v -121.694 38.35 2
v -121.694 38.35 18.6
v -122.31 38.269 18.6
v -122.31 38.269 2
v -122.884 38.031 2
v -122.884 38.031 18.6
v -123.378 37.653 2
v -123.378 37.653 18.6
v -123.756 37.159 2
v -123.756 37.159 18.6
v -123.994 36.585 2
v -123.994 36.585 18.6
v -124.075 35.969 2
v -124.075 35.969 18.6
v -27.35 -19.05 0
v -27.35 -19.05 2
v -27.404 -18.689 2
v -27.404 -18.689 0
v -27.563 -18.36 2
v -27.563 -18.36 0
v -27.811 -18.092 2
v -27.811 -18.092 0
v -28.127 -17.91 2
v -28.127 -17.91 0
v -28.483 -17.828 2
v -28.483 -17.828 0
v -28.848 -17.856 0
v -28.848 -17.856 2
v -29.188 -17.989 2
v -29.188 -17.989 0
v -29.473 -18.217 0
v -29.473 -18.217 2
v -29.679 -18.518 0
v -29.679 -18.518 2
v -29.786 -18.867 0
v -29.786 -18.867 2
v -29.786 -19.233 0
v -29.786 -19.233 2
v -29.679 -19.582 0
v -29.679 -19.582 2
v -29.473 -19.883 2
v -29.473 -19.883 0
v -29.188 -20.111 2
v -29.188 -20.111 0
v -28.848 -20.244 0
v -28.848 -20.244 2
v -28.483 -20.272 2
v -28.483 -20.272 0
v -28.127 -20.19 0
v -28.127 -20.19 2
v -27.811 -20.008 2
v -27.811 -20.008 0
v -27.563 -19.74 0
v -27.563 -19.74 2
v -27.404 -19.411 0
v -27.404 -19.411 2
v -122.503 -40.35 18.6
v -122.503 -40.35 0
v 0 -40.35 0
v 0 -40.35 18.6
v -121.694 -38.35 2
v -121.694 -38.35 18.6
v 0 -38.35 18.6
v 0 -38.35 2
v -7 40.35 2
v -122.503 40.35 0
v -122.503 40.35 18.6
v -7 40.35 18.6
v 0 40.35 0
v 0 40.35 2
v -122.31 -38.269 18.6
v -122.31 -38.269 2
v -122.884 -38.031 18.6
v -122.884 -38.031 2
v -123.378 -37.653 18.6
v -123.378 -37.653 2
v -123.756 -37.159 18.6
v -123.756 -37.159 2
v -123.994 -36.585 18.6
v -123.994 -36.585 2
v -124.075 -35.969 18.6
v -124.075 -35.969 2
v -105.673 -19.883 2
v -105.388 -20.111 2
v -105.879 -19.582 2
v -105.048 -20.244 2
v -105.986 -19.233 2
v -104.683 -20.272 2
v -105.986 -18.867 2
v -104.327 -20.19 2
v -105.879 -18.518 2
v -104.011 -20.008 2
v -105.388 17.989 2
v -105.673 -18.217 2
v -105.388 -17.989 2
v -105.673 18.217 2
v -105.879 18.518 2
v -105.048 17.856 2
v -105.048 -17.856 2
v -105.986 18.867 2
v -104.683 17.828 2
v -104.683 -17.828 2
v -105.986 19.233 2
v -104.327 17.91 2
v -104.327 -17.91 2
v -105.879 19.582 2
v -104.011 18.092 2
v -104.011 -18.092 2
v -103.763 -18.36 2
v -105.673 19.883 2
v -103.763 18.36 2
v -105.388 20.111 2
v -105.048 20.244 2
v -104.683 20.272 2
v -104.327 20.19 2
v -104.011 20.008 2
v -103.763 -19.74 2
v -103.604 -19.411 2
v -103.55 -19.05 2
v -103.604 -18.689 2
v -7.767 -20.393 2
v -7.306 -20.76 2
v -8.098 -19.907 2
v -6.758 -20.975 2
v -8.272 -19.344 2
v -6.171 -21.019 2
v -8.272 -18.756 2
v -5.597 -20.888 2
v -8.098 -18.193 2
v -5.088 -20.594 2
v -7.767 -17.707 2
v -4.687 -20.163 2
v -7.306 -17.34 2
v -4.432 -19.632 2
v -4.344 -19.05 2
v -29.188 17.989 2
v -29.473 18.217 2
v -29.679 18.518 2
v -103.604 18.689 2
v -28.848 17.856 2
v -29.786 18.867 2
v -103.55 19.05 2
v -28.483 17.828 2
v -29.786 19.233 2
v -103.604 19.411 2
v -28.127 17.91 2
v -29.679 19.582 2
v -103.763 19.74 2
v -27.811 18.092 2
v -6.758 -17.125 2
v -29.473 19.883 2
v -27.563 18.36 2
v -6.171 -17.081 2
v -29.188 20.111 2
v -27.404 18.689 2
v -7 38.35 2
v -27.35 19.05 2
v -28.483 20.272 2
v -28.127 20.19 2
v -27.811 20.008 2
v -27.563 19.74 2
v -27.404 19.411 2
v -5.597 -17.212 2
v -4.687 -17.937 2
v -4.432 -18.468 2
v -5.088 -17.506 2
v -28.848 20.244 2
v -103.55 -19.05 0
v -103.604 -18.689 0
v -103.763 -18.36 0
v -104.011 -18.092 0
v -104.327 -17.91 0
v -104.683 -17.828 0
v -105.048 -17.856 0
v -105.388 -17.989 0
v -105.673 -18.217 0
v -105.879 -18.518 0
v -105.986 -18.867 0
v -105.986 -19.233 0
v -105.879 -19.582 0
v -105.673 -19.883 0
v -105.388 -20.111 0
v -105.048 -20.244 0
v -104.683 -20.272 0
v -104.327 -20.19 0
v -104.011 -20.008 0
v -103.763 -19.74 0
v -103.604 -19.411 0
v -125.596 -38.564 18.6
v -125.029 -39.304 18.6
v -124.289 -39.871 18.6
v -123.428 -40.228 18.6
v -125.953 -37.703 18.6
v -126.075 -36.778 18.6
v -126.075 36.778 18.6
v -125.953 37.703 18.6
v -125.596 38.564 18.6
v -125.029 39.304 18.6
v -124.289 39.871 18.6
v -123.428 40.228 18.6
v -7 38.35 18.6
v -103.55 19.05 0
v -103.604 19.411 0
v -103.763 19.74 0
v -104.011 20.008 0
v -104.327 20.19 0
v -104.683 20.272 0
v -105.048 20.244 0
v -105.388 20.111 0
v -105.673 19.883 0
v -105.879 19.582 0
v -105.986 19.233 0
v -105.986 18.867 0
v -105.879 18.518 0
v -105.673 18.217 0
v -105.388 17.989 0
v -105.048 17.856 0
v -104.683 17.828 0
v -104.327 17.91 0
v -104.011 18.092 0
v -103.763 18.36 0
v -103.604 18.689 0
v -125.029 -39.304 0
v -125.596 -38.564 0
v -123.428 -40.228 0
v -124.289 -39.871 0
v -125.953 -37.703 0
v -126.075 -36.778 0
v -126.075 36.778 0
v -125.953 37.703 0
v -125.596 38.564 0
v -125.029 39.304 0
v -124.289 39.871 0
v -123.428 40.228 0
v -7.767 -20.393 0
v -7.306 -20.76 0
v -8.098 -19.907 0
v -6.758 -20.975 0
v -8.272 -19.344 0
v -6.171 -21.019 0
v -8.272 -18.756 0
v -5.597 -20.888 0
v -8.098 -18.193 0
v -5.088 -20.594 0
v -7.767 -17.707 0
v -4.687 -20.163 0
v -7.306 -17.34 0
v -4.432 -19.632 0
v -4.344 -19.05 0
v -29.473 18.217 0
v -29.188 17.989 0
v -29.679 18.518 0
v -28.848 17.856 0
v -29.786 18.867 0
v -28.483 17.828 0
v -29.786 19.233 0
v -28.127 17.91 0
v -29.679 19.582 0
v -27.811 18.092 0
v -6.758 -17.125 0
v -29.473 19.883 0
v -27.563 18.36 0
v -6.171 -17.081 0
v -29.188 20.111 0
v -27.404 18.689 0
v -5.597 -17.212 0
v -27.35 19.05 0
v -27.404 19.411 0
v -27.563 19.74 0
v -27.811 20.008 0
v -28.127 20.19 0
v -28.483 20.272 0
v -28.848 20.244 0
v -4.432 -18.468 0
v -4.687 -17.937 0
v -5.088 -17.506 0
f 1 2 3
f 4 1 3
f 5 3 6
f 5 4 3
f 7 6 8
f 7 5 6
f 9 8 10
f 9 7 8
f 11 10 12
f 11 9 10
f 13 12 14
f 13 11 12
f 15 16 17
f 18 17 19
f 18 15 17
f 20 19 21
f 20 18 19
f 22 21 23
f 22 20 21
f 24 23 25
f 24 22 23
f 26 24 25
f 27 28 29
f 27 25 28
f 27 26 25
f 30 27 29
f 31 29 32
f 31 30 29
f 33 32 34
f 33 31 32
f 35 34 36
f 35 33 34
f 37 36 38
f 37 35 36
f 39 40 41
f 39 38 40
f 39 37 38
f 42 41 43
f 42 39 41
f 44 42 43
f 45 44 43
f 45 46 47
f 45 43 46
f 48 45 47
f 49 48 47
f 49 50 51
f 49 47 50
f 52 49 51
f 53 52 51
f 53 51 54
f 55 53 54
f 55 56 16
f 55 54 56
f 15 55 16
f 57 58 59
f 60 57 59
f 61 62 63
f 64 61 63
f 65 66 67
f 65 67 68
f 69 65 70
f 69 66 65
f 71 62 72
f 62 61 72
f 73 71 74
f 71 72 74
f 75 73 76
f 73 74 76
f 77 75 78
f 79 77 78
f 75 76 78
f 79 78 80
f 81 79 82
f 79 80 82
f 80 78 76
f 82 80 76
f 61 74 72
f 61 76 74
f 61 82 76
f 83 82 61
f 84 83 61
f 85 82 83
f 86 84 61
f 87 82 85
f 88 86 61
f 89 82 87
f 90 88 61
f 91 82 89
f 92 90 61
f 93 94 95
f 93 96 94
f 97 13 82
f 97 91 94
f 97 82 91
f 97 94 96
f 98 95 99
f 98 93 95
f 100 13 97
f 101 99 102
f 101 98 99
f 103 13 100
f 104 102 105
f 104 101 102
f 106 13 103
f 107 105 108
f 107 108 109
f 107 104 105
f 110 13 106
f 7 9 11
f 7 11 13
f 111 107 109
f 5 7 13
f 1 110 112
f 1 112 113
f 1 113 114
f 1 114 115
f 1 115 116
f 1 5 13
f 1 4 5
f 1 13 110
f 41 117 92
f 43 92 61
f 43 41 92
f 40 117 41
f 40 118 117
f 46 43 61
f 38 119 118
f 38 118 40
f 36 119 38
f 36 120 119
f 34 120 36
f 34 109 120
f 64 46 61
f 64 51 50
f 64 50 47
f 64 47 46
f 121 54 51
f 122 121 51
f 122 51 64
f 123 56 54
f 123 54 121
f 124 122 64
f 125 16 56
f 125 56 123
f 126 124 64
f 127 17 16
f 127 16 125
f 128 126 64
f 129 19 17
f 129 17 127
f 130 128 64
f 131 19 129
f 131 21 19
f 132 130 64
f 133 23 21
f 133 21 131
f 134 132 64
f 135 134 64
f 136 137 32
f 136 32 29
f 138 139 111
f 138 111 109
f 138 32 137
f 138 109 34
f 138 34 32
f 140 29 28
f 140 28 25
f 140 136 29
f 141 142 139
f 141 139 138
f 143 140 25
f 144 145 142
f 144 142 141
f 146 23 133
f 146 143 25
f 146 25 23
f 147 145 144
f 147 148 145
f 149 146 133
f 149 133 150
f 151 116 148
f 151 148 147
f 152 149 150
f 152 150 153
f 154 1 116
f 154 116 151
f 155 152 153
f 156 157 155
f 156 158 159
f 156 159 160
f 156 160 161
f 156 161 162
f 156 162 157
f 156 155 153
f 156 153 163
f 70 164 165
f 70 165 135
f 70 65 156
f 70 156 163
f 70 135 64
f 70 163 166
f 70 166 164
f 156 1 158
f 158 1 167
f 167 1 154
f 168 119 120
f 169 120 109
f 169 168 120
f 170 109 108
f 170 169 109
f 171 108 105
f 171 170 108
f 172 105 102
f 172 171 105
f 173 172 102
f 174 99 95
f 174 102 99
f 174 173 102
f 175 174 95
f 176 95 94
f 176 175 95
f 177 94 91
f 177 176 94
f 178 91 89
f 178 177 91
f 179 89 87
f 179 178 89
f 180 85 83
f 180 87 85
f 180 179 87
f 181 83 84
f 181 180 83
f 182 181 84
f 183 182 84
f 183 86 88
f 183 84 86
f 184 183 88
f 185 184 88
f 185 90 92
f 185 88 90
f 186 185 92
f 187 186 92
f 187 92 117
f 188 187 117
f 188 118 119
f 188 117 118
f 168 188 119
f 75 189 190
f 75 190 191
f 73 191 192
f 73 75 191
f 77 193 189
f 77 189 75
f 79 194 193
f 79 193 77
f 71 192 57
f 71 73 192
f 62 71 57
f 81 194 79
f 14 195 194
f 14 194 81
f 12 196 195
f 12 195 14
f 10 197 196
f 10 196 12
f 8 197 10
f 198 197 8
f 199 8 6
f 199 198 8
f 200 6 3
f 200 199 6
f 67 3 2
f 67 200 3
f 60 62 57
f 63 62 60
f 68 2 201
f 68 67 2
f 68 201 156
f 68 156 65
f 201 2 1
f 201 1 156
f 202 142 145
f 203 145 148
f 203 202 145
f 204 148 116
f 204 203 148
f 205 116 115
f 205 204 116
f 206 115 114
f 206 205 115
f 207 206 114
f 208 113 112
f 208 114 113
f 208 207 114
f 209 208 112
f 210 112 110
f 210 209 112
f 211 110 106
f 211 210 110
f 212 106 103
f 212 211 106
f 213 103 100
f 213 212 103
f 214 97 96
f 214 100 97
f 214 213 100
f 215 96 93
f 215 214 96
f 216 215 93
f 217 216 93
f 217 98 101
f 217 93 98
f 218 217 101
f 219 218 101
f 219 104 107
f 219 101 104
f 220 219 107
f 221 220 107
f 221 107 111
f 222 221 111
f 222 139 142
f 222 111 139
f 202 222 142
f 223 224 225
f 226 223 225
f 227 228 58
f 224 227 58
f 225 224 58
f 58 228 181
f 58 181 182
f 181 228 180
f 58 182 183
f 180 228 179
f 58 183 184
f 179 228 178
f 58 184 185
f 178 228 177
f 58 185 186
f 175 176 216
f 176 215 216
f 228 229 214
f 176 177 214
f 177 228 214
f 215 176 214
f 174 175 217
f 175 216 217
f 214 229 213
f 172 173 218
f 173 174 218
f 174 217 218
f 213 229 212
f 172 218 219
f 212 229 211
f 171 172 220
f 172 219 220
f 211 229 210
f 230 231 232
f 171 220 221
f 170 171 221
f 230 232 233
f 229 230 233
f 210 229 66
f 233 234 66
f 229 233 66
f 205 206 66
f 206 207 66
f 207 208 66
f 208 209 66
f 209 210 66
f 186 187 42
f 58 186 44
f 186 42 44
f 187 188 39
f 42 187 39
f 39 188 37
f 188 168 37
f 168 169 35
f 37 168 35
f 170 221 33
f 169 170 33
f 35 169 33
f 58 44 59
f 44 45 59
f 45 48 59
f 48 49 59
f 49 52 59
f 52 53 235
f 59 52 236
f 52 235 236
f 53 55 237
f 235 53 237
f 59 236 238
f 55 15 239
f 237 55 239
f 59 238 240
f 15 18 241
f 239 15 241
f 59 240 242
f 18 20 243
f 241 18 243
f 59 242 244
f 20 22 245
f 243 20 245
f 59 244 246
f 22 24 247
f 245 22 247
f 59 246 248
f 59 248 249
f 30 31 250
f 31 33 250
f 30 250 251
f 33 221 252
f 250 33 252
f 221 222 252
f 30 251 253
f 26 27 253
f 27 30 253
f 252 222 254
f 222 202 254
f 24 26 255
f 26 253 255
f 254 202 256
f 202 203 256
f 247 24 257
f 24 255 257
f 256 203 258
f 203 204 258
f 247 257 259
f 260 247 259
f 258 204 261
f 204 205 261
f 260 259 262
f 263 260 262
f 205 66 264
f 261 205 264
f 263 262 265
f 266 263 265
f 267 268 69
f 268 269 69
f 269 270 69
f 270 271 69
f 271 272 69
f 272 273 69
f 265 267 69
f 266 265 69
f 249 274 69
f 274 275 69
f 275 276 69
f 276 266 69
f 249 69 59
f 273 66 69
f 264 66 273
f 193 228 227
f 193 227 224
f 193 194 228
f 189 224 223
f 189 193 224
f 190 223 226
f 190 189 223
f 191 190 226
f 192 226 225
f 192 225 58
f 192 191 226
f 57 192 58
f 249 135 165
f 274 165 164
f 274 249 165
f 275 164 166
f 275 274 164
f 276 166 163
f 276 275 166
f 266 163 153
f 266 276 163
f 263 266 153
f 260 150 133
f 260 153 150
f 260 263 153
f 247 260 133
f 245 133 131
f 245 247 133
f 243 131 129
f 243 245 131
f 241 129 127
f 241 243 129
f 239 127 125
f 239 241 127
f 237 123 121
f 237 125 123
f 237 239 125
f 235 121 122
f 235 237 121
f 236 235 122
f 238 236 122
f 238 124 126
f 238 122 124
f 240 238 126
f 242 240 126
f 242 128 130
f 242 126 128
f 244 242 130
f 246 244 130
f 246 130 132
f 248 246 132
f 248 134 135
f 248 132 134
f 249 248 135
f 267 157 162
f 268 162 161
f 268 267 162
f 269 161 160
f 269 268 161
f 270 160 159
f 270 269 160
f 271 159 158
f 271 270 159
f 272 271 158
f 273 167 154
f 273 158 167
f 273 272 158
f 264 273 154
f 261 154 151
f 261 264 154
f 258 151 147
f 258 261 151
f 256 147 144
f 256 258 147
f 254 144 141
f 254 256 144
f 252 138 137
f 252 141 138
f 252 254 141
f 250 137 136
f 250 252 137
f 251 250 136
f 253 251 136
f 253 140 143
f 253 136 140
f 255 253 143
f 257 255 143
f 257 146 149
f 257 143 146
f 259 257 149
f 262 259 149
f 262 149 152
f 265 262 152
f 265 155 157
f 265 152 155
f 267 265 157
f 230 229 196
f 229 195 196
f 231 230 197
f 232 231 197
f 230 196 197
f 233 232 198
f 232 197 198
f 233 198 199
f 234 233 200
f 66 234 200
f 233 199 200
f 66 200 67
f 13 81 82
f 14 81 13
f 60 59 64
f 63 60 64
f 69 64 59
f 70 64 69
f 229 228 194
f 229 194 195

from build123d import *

# Parameters (mm, degrees)
SKETCH_W        = 252.15
SKETCH_H        = 80.7
SKETCH_R        = 1.225
SKETCH_R_2      = 1.975
PAD_DEPTH       = 18.6
SKETCH001_W     = 248.15
SKETCH001_H     = 76.7
POCKET_DEPTH    = 16.6
FILLET_R        = 2.3813
FILLET001_R     = 3.57195
SKETCH002_W     = 14
SKETCH002_H     = 2
POCKET001_DEPTH = 16.6
SKETCH003_W     = 131.259314
SKETCH003_H     = 131.259314
POCKET002_DEPTH = 20


with BuildPart() as part:
    # Sketch → Pad (new body)
    with BuildSketch(Plane.XY):
        Rectangle(SKETCH_W, SKETCH_H)
        with Locations((-104.775, 19.05)):
            Circle(SKETCH_R, mode=Mode.SUBTRACT)
        with Locations((-28.575, 19.05)):
            Circle(SKETCH_R, mode=Mode.SUBTRACT)
        with Locations((-6.3189, -19.05)):
            Circle(SKETCH_R_2, mode=Mode.SUBTRACT)
        with Locations((-104.775, -19.05)):
            Circle(SKETCH_R, mode=Mode.SUBTRACT)
        with Locations((-28.575, -19.05)):
            Circle(SKETCH_R, mode=Mode.SUBTRACT)
        with Locations((6.3189, -19.05)):
            Circle(SKETCH_R_2, mode=Mode.SUBTRACT)
        with Locations((28.575, -19.05)):
            Circle(SKETCH_R, mode=Mode.SUBTRACT)
        with Locations((28.575, 19.05)):
            Circle(SKETCH_R, mode=Mode.SUBTRACT)
        with Locations((104.775, 19.05)):
            Circle(SKETCH_R, mode=Mode.SUBTRACT)
        with Locations((104.775, -19.05)):
            Circle(SKETCH_R, mode=Mode.SUBTRACT)
    extrude(amount=PAD_DEPTH)

    # Sketch001 (on Face16 of Pad) → Pocket (cut)
    with BuildSketch(Plane.XY.offset(18.6)):
        Rectangle(SKETCH001_W, SKETCH001_H)
    extrude(amount=-POCKET_DEPTH, mode=Mode.SUBTRACT)

    # Fillet
    fillet_edges = [part.edges().sort_by_distance(p)[0] for p in [
        (-124.075, 38.35, 10.3),
        (-124.075, -38.35, 10.3),
        (124.075, 38.35, 10.3),
        (124.075, -38.35, 10.3),
    ]]
    fillet(fillet_edges, radius=FILLET_R)

    # Fillet001
    fillet001_edges = [part.edges().sort_by_distance(p)[0] for p in [
        (-126.075, 40.35, 9.3),
        (-126.075, -40.35, 9.3),
        (126.075, -40.35, 9.3),
        (126.075, 40.35, 9.3),
    ]]
    fillet(fillet001_edges, radius=FILLET001_R)

    # Sketch002 (on Face1 of Fillet001) → Pocket001 (cut)
    with BuildSketch(Plane.XY.offset(18.6)):
        with Locations((0, 39.35)):
            Rectangle(SKETCH002_W, SKETCH002_H)
    extrude(amount=-POCKET001_DEPTH, mode=Mode.SUBTRACT)

    # Sketch003 (on Face1 of Pocket001) → Pocket002 (cut)
    with BuildSketch(Plane.XY.offset(18.6)):
        with Locations((65.629657, 0)):
            Rectangle(SKETCH003_W, SKETCH003_H)
    extrude(amount=-POCKET002_DEPTH, mode=Mode.SUBTRACT)


solid = part.part
